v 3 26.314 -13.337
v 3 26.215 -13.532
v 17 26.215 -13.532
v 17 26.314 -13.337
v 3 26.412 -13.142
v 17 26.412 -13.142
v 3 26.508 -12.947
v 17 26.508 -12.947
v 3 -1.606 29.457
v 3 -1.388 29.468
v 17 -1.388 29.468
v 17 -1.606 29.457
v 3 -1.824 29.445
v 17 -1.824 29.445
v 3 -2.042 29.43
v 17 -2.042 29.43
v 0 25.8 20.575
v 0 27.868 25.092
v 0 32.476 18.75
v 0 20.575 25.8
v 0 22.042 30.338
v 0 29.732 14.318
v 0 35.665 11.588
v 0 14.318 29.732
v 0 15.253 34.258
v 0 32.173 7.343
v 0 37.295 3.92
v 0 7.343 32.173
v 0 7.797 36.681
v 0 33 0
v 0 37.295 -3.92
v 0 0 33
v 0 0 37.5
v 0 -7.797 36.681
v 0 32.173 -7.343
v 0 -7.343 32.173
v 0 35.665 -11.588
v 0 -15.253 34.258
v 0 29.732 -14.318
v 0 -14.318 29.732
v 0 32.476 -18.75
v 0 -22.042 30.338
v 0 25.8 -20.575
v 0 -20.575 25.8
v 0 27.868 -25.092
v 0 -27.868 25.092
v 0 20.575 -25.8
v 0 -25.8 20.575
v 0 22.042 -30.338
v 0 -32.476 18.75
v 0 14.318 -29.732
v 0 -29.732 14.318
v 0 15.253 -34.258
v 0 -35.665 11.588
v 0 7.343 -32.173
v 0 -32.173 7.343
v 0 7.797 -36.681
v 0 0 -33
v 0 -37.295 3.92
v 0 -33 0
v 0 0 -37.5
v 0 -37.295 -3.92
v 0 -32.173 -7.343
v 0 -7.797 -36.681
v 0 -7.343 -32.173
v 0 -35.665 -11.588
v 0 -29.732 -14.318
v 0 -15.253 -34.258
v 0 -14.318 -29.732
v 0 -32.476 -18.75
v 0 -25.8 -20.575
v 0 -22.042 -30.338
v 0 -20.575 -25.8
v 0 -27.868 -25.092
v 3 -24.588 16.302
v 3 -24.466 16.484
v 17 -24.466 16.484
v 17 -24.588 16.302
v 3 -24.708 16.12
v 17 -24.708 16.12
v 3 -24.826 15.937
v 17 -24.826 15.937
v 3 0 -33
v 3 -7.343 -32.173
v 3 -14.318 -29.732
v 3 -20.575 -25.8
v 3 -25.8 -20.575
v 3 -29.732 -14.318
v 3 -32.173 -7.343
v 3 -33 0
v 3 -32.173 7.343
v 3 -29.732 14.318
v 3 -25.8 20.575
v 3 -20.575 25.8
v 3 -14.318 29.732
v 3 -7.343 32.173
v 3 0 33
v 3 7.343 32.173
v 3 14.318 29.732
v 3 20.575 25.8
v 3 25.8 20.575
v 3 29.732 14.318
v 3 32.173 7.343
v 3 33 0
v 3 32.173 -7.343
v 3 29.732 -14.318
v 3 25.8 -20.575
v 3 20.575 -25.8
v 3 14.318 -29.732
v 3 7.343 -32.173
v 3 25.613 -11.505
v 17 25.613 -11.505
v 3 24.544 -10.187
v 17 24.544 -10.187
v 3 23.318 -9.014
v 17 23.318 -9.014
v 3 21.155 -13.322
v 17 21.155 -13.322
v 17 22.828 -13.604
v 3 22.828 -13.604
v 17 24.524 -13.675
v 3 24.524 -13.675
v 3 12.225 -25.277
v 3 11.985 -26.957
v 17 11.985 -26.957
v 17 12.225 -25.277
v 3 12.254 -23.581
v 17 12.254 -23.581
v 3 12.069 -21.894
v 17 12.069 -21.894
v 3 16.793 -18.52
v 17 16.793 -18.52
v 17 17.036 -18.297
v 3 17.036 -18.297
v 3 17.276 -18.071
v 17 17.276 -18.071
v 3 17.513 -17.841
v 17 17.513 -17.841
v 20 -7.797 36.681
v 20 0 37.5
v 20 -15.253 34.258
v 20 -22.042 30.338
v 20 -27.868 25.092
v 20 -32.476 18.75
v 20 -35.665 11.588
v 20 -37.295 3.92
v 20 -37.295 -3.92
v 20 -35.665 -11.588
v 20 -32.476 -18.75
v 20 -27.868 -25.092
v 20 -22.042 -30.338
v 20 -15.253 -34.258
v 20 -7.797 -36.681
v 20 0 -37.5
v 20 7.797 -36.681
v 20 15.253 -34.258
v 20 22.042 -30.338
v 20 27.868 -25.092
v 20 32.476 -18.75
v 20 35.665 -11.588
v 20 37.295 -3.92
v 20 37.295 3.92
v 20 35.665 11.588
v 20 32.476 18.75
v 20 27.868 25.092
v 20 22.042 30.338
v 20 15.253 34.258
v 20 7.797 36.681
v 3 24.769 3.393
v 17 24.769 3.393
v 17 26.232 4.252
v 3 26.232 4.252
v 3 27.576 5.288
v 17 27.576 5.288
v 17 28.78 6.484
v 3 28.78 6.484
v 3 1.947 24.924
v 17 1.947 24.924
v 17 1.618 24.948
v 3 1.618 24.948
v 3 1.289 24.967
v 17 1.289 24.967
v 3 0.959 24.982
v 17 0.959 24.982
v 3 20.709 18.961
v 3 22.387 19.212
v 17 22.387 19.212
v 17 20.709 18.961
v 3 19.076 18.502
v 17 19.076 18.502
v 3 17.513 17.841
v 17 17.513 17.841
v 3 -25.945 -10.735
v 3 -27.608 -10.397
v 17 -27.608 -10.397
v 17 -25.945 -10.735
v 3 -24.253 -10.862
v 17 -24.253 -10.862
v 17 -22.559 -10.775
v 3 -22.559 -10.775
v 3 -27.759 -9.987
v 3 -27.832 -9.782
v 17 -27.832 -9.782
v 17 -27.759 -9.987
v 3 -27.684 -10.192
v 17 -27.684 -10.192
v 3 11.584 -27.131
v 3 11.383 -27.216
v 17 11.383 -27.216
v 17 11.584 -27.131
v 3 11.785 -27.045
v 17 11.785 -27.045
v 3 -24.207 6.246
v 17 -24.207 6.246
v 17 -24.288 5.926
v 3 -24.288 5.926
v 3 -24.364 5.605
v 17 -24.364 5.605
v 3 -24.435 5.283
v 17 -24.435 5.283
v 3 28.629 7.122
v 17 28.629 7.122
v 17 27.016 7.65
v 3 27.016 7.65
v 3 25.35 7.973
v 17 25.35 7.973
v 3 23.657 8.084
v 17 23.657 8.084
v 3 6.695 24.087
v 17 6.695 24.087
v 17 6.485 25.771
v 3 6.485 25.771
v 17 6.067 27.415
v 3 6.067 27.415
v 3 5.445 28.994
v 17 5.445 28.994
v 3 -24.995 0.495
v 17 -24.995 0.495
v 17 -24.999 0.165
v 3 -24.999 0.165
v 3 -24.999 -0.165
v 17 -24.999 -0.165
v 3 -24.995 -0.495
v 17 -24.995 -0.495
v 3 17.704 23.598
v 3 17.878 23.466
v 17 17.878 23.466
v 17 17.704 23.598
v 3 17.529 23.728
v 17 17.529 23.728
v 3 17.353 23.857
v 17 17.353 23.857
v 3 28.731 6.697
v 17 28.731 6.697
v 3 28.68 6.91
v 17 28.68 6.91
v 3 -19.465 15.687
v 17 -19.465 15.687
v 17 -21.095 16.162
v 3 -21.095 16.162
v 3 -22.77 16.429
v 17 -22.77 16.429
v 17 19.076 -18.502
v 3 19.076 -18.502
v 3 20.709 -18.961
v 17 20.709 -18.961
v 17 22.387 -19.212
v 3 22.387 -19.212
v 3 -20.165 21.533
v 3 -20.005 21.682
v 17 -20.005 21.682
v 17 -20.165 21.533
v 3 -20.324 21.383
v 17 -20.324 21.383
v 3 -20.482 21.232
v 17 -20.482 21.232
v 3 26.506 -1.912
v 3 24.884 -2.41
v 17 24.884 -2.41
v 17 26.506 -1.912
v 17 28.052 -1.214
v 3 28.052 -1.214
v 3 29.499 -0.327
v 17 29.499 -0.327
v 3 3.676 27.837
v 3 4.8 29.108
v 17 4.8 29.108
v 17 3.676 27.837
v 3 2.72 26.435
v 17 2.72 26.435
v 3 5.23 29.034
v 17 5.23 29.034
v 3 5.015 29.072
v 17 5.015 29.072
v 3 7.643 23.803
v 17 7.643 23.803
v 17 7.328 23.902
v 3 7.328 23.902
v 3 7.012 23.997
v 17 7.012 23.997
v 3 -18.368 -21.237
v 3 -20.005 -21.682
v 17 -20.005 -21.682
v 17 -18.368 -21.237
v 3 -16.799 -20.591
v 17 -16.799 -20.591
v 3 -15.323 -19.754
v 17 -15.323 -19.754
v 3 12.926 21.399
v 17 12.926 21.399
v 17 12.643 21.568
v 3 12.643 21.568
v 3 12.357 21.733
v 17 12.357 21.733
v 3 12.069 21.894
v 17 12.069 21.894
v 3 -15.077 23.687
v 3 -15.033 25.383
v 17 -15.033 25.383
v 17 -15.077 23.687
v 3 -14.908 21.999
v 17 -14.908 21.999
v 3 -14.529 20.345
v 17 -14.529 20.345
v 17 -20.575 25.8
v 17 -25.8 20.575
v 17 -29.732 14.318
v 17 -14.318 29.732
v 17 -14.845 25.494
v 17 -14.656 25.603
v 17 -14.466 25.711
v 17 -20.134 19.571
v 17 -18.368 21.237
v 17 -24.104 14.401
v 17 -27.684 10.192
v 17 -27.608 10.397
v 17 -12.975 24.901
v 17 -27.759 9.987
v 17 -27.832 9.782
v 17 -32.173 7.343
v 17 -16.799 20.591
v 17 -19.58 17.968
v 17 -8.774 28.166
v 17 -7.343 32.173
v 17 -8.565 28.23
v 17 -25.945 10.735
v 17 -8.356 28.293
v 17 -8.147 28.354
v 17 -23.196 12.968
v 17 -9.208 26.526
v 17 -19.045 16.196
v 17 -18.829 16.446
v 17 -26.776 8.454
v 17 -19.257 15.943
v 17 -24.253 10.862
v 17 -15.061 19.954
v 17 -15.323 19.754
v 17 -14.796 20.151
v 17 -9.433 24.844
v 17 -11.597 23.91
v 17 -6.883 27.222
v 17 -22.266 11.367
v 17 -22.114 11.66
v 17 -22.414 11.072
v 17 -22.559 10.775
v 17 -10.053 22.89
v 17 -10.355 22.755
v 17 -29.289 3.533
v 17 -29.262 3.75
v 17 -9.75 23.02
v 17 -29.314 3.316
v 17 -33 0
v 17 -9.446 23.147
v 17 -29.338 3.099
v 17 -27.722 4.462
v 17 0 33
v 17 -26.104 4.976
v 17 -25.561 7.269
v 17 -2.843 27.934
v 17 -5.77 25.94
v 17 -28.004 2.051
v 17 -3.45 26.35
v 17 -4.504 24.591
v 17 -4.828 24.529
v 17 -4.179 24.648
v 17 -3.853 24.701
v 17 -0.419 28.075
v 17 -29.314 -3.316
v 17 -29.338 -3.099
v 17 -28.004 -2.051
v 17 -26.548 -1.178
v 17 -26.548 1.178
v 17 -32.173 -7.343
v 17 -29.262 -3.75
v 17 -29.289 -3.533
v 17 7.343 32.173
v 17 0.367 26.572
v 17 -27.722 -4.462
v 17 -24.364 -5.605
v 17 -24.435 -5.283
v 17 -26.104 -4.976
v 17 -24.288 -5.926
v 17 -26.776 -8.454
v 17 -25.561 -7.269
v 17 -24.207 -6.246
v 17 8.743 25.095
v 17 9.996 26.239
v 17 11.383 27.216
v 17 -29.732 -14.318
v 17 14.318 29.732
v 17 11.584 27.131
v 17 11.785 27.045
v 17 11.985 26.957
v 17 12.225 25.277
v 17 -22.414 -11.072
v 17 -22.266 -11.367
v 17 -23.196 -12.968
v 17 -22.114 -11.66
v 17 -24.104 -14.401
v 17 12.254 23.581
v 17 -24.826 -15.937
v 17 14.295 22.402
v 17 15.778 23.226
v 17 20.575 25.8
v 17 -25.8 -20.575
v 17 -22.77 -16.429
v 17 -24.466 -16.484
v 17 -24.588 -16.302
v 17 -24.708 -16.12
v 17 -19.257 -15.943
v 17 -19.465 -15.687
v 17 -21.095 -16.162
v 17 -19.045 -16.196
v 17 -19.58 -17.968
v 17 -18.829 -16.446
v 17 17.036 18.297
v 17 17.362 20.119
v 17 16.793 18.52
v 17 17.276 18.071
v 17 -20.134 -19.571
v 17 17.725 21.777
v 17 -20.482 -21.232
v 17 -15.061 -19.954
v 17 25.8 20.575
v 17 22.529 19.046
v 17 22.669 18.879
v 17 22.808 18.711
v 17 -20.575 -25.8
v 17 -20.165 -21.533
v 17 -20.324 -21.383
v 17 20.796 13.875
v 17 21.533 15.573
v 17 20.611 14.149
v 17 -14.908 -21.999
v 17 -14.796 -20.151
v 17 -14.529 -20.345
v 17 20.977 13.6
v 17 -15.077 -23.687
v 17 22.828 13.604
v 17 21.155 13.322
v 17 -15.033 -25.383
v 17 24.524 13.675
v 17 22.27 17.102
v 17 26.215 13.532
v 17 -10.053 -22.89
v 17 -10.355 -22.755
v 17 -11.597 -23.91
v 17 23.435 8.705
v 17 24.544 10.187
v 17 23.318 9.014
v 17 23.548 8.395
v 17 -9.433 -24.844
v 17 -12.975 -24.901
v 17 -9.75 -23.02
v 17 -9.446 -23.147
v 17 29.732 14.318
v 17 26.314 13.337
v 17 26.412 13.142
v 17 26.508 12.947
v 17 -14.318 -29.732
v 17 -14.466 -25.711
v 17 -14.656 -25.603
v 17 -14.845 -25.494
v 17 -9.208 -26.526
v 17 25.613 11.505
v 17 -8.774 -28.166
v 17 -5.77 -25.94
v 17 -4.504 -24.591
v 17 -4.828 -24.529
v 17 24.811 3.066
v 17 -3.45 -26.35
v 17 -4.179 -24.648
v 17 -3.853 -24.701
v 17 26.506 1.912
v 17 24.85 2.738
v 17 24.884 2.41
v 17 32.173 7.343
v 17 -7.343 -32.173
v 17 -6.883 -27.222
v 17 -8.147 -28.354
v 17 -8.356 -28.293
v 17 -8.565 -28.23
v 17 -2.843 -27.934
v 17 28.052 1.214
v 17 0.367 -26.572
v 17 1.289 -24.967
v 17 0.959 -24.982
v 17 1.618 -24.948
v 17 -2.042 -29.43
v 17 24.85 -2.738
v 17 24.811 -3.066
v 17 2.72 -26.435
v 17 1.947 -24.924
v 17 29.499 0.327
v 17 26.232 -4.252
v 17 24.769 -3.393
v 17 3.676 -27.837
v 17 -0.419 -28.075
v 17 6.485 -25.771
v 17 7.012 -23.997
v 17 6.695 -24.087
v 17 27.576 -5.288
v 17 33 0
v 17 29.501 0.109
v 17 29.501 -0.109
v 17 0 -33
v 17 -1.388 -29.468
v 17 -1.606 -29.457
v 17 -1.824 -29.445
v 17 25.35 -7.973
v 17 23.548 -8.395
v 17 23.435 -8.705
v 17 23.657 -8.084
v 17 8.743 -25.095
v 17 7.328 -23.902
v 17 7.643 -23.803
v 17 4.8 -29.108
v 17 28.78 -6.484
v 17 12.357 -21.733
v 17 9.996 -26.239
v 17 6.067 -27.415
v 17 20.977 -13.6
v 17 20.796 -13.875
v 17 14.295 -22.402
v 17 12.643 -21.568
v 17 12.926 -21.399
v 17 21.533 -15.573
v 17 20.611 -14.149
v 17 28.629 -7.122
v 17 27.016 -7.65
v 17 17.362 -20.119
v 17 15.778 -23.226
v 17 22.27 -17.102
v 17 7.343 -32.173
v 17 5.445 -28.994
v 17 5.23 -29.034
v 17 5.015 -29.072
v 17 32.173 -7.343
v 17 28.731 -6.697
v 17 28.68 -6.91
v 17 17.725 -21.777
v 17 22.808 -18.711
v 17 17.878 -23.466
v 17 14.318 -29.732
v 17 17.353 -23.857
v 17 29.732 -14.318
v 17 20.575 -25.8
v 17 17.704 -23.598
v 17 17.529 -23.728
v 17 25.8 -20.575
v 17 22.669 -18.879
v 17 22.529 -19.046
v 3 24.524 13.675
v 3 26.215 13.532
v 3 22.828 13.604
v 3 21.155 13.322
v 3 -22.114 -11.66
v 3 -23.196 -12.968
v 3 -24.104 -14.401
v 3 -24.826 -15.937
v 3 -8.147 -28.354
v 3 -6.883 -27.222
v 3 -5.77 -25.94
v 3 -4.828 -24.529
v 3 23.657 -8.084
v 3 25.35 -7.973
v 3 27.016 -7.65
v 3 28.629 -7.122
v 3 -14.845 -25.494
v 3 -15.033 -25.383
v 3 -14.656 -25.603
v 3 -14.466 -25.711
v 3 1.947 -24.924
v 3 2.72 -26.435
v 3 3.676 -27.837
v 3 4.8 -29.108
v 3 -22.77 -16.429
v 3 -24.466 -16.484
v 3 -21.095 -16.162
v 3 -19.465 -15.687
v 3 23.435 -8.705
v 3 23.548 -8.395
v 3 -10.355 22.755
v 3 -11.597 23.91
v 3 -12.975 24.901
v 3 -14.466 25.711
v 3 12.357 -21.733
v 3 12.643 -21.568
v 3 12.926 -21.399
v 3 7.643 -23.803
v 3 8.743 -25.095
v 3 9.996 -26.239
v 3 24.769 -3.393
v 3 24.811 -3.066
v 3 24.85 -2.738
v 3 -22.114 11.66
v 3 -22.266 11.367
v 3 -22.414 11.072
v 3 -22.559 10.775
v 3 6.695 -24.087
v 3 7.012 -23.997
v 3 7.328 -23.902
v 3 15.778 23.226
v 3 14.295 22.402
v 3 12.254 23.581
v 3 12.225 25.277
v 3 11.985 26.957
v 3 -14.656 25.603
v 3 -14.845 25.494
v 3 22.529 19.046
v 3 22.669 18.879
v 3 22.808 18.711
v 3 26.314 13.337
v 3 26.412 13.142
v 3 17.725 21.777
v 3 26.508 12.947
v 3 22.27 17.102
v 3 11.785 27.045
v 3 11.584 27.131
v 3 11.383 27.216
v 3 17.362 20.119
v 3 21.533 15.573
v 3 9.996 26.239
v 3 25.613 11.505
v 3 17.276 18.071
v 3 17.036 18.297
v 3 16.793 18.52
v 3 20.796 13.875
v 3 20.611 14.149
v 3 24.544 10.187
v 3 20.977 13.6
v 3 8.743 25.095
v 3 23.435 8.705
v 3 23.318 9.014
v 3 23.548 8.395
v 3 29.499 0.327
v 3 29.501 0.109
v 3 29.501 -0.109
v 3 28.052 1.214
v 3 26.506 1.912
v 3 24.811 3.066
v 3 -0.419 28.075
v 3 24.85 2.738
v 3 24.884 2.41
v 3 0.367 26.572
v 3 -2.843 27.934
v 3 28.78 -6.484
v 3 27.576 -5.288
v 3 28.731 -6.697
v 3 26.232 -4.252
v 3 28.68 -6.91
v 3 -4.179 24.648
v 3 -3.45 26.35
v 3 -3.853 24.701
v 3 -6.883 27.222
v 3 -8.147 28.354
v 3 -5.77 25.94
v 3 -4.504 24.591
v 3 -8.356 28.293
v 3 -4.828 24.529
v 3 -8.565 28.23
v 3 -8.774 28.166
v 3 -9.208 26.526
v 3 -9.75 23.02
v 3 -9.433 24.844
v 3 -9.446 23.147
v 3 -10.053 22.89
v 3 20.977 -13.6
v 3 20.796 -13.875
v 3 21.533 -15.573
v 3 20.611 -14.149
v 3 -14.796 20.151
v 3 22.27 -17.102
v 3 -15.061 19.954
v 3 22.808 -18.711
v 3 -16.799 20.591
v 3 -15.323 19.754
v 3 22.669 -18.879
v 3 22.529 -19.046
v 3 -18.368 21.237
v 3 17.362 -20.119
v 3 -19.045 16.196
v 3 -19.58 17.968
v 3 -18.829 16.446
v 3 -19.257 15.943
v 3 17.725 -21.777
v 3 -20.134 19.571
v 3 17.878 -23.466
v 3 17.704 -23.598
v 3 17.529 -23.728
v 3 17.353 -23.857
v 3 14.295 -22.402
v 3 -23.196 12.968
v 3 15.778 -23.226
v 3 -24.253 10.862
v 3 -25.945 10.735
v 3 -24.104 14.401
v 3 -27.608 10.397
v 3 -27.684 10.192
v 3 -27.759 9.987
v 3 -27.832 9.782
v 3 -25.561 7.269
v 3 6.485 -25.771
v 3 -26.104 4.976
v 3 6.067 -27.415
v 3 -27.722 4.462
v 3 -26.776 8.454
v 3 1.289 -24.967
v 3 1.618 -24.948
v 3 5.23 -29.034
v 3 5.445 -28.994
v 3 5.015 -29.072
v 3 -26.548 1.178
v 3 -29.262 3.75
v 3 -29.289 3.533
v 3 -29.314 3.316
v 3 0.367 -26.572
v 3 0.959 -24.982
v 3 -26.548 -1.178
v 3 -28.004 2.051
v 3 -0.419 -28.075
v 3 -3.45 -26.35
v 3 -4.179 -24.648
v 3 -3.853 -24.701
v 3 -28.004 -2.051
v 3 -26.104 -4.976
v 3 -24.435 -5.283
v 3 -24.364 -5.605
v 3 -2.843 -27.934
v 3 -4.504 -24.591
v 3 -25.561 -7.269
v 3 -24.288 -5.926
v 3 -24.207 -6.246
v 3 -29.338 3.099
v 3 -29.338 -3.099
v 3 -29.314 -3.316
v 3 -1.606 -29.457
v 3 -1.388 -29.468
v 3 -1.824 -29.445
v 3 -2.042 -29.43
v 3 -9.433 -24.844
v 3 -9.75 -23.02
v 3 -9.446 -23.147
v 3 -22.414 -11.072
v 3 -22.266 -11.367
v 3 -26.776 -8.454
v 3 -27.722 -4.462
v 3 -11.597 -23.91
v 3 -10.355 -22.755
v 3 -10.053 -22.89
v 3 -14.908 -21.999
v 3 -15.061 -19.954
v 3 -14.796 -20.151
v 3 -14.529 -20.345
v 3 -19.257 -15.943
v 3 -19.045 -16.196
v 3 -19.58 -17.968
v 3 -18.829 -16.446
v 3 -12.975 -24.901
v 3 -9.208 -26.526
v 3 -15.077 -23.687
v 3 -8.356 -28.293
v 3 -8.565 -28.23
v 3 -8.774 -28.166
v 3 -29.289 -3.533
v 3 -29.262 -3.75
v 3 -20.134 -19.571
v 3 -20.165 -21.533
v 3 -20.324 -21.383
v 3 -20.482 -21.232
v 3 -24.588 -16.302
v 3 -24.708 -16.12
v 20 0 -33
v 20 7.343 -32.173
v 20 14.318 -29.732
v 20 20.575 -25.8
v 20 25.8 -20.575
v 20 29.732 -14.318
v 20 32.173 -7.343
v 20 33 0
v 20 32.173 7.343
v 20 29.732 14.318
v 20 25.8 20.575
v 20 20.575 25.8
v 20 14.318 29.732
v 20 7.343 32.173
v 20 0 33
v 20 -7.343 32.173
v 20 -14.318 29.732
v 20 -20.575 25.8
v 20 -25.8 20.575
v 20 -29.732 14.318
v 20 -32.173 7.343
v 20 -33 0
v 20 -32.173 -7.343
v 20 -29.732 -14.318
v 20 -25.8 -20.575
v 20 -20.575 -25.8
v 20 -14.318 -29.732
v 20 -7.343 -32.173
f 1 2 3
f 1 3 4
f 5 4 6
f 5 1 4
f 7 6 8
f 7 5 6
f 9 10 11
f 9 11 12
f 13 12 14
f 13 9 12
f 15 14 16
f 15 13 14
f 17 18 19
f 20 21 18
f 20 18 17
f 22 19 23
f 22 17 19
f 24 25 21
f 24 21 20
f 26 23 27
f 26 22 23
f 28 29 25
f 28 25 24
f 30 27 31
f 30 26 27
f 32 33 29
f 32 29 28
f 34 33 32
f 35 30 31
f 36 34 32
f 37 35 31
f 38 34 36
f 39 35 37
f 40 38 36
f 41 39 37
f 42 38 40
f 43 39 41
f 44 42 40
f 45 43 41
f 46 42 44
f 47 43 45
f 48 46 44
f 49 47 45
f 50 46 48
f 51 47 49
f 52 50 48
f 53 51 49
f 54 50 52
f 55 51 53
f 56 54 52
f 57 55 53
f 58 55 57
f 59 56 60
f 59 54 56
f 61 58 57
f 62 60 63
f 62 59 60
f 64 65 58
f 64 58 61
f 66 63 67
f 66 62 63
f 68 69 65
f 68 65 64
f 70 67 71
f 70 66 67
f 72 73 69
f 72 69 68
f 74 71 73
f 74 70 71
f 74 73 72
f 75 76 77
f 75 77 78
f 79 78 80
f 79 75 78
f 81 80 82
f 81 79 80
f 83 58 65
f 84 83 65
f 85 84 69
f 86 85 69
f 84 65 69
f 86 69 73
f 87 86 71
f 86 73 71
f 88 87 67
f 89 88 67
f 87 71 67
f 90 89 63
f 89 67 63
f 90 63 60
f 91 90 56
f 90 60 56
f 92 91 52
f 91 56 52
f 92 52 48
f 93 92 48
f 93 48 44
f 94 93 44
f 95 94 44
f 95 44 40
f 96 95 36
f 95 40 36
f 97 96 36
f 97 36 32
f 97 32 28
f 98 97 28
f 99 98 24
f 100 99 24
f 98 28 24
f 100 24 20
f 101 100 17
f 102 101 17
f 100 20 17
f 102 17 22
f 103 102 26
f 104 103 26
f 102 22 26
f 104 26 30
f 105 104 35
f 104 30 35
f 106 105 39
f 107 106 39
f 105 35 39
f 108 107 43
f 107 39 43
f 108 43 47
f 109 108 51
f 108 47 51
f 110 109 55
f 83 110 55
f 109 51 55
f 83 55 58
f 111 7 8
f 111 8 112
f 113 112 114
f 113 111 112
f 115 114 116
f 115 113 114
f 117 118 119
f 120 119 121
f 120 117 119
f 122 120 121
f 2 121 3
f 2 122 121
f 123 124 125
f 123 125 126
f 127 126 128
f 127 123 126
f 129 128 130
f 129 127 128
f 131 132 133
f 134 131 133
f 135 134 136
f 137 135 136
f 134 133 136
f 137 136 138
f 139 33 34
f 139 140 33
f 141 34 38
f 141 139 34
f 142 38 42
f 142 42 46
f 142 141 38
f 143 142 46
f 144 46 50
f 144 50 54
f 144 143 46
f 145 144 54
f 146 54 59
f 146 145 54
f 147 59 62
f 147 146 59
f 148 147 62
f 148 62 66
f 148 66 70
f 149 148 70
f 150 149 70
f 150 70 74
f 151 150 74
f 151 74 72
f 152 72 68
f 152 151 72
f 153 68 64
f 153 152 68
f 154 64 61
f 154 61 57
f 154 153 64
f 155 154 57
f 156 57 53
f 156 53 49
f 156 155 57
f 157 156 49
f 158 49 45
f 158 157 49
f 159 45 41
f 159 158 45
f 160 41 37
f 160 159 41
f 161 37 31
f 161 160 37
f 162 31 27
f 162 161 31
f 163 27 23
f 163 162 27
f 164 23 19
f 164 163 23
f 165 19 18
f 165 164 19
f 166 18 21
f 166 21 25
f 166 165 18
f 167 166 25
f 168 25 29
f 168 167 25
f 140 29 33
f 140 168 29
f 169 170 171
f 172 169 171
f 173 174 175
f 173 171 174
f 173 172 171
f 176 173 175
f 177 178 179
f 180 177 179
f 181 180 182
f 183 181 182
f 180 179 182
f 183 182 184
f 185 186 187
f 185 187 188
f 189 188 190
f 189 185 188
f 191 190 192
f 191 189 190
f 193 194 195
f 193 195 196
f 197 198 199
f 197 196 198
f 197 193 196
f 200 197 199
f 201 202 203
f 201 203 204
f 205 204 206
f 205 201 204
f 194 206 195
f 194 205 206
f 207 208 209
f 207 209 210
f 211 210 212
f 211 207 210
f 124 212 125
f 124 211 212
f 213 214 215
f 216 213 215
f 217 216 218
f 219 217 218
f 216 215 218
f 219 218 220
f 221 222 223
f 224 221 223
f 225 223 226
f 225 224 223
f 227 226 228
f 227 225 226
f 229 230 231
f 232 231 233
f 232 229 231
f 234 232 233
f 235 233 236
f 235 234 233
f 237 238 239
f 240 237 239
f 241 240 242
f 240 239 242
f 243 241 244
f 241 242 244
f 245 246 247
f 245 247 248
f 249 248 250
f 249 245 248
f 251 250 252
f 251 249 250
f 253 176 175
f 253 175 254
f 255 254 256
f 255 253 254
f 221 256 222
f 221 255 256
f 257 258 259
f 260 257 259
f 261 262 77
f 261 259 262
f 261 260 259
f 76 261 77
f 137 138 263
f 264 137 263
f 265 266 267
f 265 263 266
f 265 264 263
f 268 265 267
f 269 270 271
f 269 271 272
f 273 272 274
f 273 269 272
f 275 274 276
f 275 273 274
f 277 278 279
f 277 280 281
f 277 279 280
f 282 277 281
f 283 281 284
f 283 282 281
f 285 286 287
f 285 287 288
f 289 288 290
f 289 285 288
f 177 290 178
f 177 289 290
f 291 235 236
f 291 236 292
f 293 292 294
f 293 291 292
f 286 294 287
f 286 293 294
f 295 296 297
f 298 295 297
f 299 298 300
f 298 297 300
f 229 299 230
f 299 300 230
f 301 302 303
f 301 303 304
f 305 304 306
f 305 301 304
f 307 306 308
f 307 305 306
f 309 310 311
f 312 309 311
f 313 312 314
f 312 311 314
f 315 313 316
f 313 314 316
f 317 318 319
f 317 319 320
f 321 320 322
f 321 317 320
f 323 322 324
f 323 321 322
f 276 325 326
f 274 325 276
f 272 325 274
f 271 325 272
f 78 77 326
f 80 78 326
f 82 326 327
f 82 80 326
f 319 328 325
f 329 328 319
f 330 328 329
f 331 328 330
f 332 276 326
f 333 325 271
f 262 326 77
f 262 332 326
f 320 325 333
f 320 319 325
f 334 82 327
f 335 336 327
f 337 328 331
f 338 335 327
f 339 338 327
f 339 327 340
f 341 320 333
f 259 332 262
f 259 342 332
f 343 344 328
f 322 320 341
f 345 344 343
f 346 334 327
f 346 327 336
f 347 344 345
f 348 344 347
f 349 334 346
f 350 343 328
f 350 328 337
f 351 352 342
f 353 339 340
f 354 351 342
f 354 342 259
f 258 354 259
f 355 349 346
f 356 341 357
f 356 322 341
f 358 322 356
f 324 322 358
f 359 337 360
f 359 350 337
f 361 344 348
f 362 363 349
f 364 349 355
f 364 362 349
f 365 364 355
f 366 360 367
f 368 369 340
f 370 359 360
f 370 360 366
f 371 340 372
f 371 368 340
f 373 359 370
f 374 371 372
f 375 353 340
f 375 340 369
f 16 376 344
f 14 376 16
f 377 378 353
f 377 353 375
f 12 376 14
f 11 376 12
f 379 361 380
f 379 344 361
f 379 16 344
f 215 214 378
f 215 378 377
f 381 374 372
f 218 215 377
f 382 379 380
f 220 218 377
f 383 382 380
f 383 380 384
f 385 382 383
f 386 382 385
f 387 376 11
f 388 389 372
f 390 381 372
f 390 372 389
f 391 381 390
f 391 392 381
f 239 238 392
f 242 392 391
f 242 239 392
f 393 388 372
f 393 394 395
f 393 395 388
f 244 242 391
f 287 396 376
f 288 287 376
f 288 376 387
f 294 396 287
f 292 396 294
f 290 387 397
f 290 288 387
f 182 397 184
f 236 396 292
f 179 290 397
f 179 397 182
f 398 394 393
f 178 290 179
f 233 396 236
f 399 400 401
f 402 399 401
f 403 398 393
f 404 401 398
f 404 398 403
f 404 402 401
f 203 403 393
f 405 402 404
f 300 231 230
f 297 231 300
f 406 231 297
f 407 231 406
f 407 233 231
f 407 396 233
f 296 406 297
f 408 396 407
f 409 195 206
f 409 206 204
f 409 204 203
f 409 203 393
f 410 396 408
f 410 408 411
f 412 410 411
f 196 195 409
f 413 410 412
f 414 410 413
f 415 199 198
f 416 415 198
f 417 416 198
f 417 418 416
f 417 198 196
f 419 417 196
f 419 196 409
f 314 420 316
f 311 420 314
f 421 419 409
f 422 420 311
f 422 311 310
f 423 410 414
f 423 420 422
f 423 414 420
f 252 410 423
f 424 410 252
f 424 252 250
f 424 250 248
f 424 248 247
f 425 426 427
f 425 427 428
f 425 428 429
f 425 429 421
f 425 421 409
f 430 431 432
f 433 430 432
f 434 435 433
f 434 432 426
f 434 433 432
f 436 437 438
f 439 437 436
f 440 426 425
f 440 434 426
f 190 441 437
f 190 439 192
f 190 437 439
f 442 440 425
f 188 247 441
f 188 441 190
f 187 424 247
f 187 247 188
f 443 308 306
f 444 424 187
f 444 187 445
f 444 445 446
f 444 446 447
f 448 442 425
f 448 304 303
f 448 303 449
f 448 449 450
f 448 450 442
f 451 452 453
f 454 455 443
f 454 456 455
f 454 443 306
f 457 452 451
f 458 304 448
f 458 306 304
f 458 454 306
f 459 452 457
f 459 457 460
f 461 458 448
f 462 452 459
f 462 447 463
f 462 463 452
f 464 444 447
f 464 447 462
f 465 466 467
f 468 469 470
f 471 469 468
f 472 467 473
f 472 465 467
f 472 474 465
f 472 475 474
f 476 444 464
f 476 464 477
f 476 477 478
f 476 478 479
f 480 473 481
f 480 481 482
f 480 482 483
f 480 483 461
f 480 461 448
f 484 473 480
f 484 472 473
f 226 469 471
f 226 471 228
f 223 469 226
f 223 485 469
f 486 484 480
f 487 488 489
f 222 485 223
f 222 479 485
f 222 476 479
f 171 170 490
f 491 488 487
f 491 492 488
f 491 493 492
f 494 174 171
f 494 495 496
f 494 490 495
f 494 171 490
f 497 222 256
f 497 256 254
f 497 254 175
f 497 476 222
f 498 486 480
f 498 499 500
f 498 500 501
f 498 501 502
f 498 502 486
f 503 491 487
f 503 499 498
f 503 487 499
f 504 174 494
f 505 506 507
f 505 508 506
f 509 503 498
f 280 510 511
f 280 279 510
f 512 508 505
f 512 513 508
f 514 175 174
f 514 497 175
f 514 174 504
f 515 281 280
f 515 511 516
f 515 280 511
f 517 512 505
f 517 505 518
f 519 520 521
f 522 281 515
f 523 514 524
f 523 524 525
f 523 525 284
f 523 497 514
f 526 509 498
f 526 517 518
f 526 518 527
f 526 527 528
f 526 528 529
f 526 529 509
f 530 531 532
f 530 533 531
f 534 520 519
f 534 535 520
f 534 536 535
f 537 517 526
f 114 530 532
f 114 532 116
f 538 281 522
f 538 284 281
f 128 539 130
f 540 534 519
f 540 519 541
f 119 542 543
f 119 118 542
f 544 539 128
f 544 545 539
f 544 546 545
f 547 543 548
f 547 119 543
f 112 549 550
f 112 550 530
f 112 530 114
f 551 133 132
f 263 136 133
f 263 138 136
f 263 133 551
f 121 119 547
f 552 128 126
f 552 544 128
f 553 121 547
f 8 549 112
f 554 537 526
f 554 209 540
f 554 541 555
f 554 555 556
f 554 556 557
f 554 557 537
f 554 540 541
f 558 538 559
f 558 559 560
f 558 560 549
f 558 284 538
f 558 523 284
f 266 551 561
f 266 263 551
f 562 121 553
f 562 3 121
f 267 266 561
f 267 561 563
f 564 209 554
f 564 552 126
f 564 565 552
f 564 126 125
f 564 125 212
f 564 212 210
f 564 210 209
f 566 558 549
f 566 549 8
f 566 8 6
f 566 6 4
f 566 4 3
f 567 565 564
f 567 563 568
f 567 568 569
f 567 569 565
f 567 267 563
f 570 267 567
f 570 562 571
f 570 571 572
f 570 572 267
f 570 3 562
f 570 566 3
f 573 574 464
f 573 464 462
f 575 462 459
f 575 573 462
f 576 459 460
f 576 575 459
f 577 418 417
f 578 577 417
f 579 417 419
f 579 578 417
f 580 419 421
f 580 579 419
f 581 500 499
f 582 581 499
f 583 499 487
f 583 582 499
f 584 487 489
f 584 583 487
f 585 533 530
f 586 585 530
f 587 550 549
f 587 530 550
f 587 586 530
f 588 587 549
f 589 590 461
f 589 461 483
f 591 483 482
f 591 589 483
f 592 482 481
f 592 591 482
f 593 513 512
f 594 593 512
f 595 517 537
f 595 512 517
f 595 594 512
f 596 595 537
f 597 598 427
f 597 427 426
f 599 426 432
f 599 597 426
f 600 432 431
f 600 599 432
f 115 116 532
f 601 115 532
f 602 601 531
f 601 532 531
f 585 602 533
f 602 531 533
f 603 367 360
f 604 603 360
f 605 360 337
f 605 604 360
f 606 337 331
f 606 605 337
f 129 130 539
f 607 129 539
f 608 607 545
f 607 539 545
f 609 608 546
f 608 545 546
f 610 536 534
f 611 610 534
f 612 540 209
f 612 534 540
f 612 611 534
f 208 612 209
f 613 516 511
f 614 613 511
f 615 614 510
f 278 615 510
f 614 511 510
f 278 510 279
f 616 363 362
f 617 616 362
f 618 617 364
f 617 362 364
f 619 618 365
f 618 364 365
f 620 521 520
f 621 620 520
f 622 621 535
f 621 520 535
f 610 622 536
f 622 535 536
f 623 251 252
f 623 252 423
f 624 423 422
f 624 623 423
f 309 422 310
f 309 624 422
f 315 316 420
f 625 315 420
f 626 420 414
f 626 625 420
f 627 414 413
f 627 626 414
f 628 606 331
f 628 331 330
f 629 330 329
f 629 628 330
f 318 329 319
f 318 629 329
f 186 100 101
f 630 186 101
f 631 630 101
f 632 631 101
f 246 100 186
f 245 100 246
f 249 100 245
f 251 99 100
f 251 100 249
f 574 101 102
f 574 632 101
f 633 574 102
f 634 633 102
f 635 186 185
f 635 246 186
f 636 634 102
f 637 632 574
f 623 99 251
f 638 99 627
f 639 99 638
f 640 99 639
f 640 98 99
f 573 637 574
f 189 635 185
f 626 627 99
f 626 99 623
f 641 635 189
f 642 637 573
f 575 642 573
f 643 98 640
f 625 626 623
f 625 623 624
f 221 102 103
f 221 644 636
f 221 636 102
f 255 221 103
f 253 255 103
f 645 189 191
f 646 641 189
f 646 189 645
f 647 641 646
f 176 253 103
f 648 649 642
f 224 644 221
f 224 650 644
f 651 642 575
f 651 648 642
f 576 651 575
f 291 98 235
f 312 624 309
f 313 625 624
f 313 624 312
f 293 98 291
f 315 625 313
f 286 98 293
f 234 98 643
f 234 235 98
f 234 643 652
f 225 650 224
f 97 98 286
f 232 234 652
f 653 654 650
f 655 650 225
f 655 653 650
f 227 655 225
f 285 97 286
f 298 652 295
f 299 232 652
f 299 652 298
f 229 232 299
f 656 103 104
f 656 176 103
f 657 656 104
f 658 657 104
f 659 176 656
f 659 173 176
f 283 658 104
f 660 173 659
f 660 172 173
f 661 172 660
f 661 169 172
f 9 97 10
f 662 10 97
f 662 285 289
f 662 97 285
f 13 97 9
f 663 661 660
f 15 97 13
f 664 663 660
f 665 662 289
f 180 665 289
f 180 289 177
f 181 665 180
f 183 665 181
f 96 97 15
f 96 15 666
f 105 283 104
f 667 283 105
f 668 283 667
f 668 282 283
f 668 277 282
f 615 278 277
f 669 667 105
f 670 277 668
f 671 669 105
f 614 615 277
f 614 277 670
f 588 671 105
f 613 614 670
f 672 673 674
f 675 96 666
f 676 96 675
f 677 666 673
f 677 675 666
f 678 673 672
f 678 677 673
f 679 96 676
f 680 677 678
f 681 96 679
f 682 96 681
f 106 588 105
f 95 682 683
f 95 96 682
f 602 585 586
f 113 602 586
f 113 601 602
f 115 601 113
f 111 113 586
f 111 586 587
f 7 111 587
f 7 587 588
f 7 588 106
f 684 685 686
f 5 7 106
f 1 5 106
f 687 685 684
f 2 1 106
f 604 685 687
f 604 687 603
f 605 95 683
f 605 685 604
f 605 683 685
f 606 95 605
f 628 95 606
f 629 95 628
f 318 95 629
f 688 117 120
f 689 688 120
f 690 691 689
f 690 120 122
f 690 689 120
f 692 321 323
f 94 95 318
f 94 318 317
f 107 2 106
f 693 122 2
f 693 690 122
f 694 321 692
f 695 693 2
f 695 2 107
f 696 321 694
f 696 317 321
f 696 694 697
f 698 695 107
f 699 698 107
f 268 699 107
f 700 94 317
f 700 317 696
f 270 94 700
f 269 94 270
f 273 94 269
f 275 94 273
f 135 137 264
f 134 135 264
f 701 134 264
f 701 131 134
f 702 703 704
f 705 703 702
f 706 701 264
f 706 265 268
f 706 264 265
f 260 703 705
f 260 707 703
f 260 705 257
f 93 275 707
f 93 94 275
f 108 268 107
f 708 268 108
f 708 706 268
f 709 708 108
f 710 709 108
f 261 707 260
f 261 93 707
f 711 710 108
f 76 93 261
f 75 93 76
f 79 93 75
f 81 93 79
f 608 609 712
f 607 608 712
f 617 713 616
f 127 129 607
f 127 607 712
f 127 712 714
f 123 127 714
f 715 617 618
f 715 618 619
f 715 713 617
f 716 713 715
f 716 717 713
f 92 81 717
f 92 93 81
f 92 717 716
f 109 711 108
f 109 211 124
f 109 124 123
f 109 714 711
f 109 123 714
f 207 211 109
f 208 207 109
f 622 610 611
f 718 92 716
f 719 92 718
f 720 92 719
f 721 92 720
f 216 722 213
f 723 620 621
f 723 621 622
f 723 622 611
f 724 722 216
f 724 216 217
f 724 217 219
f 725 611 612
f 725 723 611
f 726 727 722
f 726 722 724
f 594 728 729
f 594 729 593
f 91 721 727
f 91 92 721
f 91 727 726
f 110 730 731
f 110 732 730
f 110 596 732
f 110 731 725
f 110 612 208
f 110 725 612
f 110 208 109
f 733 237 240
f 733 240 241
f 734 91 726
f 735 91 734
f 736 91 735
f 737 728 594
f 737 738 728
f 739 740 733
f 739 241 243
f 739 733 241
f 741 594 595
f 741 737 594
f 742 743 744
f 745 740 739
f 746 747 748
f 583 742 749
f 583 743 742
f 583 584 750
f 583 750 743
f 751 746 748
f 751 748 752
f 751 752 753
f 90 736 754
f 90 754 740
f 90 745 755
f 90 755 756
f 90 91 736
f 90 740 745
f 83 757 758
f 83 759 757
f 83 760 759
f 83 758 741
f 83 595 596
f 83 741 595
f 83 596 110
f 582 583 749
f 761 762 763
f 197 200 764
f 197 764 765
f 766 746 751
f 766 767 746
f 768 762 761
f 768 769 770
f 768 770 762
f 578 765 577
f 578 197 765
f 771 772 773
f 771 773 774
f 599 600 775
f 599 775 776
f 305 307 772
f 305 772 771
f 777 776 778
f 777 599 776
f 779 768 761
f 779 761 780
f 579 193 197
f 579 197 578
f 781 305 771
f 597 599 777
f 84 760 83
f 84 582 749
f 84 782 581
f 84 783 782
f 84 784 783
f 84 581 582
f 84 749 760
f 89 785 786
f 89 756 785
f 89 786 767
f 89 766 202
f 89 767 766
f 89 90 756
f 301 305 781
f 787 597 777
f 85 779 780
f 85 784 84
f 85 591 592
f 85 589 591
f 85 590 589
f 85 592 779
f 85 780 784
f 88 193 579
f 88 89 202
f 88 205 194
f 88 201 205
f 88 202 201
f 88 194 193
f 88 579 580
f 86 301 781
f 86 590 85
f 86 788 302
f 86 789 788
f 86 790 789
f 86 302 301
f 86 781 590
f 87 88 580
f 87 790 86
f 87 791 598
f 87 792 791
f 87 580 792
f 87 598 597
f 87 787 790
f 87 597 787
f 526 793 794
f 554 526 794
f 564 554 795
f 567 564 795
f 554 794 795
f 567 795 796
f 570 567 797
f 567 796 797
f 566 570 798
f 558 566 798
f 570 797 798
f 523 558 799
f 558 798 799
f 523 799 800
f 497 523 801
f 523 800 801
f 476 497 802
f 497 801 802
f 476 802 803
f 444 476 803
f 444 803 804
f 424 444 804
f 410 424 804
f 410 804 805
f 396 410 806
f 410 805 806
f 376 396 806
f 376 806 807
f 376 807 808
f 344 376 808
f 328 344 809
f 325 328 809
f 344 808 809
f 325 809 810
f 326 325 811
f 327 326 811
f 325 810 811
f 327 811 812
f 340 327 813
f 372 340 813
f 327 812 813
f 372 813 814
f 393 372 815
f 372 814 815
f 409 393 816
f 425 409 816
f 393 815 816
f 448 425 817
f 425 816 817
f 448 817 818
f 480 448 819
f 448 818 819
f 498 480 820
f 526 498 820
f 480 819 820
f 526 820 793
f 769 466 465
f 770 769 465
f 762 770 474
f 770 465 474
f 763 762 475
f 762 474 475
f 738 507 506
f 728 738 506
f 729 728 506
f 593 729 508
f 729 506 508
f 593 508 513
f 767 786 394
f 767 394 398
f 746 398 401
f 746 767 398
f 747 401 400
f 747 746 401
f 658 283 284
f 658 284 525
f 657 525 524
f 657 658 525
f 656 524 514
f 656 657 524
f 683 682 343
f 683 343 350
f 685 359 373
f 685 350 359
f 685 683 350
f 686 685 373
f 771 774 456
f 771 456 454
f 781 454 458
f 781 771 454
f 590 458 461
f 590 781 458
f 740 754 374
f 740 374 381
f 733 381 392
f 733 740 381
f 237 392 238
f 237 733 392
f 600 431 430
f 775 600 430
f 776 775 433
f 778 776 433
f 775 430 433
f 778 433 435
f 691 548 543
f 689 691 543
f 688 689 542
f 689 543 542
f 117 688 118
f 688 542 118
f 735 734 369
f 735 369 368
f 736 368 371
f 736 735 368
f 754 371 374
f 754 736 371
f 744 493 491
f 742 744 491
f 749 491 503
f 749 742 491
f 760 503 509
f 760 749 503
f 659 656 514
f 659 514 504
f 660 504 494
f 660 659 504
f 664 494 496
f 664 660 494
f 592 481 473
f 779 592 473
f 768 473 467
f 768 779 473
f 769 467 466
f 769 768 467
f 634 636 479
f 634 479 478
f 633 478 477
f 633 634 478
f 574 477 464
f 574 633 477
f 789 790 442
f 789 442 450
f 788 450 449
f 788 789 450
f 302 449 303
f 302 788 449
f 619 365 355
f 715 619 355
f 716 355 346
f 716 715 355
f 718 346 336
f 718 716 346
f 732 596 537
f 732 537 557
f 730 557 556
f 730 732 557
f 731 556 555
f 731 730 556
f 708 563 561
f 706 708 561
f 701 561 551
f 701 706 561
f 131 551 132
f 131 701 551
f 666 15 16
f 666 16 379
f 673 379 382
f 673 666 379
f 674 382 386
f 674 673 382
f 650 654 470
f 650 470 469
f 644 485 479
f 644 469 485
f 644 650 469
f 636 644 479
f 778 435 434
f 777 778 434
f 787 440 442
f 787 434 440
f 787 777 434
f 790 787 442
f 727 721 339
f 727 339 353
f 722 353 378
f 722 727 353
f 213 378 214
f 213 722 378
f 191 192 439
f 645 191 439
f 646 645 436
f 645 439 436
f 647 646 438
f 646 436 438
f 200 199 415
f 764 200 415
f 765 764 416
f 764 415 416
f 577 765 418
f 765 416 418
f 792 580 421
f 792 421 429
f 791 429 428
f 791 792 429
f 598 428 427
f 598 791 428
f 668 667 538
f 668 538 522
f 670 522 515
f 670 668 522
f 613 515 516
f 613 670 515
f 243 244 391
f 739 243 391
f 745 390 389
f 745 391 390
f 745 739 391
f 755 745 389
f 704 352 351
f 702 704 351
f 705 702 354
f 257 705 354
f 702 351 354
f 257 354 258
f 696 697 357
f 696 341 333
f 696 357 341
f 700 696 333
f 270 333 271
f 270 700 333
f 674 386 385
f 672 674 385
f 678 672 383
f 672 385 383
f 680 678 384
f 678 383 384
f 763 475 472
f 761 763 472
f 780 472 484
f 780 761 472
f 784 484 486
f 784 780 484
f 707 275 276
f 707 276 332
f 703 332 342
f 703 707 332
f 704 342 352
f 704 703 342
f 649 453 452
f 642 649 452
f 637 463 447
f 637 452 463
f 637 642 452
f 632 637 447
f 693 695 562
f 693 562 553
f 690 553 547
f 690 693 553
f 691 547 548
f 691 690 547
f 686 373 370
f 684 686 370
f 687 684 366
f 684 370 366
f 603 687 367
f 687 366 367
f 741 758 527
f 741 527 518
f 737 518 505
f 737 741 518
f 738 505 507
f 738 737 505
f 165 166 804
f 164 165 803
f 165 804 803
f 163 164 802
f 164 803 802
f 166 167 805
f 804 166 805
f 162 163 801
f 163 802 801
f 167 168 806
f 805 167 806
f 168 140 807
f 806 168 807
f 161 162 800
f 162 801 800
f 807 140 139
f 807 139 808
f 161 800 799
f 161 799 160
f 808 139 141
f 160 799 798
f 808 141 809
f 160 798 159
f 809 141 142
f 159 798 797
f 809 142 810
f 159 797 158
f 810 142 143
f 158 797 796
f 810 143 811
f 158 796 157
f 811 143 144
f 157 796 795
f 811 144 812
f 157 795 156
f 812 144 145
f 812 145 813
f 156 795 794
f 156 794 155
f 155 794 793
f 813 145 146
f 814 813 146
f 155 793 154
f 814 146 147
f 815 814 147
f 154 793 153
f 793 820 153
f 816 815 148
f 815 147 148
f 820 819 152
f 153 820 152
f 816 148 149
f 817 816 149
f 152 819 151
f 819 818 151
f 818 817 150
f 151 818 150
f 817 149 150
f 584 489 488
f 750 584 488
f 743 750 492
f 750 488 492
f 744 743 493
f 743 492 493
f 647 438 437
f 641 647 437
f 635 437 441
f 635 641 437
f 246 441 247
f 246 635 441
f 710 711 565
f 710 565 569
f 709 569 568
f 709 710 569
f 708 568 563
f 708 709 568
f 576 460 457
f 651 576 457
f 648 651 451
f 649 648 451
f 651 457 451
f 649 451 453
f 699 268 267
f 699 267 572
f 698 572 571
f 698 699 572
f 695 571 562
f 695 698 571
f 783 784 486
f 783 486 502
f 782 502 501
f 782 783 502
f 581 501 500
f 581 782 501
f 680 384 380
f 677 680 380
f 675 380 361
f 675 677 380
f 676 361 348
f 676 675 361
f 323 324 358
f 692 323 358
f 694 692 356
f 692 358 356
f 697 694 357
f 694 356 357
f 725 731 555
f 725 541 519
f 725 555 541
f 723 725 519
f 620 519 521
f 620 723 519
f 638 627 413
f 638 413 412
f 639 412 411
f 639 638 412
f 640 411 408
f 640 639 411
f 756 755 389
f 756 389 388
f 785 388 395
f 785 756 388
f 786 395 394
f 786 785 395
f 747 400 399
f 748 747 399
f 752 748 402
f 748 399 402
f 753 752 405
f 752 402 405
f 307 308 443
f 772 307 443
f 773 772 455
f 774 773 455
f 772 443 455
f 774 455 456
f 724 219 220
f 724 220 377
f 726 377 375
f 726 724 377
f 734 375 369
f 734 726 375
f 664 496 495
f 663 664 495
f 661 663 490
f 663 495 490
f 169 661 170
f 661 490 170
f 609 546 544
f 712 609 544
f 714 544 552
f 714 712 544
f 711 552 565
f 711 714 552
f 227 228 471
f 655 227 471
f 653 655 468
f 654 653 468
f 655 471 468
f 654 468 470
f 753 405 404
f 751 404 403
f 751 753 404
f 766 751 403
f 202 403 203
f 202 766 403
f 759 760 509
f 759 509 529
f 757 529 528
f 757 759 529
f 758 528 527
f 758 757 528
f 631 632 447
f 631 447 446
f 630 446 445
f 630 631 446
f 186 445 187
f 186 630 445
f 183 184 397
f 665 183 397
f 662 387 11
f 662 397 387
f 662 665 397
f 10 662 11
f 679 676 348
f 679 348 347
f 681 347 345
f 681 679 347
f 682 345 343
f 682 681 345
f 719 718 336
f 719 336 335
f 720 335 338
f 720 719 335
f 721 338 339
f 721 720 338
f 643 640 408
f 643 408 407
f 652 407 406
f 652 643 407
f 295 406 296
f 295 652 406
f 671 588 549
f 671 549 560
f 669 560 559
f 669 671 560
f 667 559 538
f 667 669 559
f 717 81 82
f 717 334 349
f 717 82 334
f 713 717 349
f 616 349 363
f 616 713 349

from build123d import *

# Parameters (mm, degrees)
BASPROSKE_W        = 20
BASPROSKE_H        = 12.5
TOOTHCUT_DEPTH     = 57.678920244
TEETHCUTS_COUNT    = 27
TEETHCUTS_ANGLE    = 346.666666667
SKETCH1_R          = 33
CUT_EXTRUDE1_DEPTH = 3
CUT_EXTRUDE2_START = -3
SKETCH2_R          = 33
CUT_EXTRUDE2_DEPTH = 3


with BuildPart() as part:
    # BasProSke → Base-Revolve (revolve)
    with BuildSketch(Plane(origin=(0, 0, 0), x_dir=(1, 0, 0), z_dir=(0, 1, 0))):
        with Locations((10, 31.25)):
            Rectangle(BASPROSKE_W, BASPROSKE_H)
    revolve(axis=Axis((-10, 0, 0), (1, 0, 0)))

    # TooCutSke → ToothCut (cut, through all)
    with BuildSketch(Plane(origin=(0, 0, 0), x_dir=(0, 0, -1), z_dir=(1, 0, 0))):
        with BuildLine():
            ThreePointArc((2.416400206, 24.85742656), (1.592639823, 27.277654117), (0.32737703, 29.499183468))
            ThreePointArc((0.32737703, 29.499183468), (0, 29.501), (-0.32737703, 29.499183468))
            ThreePointArc((-0.32737703, 29.499183468), (-1.592639823, 27.277654117), (-2.416400206, 24.85742656))
            ThreePointArc((-2.416400206, 24.85742656), (0, 24.9746), (2.416400206, 24.85742656))
        make_face()
    toothcut = extrude(amount=TOOTHCUT_DEPTH, mode=Mode.SUBTRACT)

    # TeethCuts: ToothCut ×27 about axis
    teethcuts_axis = Axis((-10, 0, 0), (1, 0, 0))
    for i in range(1, TEETHCUTS_COUNT):
        add(toothcut.rotate(teethcuts_axis, i * TEETHCUTS_ANGLE / (TEETHCUTS_COUNT - 1)), mode=Mode.SUBTRACT)

    # Sketch1 → Cut-Extrude1 (cut)
    with BuildSketch(Plane(origin=(20, 0, 0), x_dir=(0, 0, -1), z_dir=(1, 0, 0))):
        Circle(SKETCH1_R)
    extrude(amount=-CUT_EXTRUDE1_DEPTH, mode=Mode.SUBTRACT)

    # Sketch2 → Cut-Extrude2 (cut)
    with BuildSketch(Plane.ZY.offset(CUT_EXTRUDE2_START)):
        Circle(SKETCH2_R)
    extrude(amount=CUT_EXTRUDE2_DEPTH, mode=Mode.SUBTRACT)


solid = part.part
